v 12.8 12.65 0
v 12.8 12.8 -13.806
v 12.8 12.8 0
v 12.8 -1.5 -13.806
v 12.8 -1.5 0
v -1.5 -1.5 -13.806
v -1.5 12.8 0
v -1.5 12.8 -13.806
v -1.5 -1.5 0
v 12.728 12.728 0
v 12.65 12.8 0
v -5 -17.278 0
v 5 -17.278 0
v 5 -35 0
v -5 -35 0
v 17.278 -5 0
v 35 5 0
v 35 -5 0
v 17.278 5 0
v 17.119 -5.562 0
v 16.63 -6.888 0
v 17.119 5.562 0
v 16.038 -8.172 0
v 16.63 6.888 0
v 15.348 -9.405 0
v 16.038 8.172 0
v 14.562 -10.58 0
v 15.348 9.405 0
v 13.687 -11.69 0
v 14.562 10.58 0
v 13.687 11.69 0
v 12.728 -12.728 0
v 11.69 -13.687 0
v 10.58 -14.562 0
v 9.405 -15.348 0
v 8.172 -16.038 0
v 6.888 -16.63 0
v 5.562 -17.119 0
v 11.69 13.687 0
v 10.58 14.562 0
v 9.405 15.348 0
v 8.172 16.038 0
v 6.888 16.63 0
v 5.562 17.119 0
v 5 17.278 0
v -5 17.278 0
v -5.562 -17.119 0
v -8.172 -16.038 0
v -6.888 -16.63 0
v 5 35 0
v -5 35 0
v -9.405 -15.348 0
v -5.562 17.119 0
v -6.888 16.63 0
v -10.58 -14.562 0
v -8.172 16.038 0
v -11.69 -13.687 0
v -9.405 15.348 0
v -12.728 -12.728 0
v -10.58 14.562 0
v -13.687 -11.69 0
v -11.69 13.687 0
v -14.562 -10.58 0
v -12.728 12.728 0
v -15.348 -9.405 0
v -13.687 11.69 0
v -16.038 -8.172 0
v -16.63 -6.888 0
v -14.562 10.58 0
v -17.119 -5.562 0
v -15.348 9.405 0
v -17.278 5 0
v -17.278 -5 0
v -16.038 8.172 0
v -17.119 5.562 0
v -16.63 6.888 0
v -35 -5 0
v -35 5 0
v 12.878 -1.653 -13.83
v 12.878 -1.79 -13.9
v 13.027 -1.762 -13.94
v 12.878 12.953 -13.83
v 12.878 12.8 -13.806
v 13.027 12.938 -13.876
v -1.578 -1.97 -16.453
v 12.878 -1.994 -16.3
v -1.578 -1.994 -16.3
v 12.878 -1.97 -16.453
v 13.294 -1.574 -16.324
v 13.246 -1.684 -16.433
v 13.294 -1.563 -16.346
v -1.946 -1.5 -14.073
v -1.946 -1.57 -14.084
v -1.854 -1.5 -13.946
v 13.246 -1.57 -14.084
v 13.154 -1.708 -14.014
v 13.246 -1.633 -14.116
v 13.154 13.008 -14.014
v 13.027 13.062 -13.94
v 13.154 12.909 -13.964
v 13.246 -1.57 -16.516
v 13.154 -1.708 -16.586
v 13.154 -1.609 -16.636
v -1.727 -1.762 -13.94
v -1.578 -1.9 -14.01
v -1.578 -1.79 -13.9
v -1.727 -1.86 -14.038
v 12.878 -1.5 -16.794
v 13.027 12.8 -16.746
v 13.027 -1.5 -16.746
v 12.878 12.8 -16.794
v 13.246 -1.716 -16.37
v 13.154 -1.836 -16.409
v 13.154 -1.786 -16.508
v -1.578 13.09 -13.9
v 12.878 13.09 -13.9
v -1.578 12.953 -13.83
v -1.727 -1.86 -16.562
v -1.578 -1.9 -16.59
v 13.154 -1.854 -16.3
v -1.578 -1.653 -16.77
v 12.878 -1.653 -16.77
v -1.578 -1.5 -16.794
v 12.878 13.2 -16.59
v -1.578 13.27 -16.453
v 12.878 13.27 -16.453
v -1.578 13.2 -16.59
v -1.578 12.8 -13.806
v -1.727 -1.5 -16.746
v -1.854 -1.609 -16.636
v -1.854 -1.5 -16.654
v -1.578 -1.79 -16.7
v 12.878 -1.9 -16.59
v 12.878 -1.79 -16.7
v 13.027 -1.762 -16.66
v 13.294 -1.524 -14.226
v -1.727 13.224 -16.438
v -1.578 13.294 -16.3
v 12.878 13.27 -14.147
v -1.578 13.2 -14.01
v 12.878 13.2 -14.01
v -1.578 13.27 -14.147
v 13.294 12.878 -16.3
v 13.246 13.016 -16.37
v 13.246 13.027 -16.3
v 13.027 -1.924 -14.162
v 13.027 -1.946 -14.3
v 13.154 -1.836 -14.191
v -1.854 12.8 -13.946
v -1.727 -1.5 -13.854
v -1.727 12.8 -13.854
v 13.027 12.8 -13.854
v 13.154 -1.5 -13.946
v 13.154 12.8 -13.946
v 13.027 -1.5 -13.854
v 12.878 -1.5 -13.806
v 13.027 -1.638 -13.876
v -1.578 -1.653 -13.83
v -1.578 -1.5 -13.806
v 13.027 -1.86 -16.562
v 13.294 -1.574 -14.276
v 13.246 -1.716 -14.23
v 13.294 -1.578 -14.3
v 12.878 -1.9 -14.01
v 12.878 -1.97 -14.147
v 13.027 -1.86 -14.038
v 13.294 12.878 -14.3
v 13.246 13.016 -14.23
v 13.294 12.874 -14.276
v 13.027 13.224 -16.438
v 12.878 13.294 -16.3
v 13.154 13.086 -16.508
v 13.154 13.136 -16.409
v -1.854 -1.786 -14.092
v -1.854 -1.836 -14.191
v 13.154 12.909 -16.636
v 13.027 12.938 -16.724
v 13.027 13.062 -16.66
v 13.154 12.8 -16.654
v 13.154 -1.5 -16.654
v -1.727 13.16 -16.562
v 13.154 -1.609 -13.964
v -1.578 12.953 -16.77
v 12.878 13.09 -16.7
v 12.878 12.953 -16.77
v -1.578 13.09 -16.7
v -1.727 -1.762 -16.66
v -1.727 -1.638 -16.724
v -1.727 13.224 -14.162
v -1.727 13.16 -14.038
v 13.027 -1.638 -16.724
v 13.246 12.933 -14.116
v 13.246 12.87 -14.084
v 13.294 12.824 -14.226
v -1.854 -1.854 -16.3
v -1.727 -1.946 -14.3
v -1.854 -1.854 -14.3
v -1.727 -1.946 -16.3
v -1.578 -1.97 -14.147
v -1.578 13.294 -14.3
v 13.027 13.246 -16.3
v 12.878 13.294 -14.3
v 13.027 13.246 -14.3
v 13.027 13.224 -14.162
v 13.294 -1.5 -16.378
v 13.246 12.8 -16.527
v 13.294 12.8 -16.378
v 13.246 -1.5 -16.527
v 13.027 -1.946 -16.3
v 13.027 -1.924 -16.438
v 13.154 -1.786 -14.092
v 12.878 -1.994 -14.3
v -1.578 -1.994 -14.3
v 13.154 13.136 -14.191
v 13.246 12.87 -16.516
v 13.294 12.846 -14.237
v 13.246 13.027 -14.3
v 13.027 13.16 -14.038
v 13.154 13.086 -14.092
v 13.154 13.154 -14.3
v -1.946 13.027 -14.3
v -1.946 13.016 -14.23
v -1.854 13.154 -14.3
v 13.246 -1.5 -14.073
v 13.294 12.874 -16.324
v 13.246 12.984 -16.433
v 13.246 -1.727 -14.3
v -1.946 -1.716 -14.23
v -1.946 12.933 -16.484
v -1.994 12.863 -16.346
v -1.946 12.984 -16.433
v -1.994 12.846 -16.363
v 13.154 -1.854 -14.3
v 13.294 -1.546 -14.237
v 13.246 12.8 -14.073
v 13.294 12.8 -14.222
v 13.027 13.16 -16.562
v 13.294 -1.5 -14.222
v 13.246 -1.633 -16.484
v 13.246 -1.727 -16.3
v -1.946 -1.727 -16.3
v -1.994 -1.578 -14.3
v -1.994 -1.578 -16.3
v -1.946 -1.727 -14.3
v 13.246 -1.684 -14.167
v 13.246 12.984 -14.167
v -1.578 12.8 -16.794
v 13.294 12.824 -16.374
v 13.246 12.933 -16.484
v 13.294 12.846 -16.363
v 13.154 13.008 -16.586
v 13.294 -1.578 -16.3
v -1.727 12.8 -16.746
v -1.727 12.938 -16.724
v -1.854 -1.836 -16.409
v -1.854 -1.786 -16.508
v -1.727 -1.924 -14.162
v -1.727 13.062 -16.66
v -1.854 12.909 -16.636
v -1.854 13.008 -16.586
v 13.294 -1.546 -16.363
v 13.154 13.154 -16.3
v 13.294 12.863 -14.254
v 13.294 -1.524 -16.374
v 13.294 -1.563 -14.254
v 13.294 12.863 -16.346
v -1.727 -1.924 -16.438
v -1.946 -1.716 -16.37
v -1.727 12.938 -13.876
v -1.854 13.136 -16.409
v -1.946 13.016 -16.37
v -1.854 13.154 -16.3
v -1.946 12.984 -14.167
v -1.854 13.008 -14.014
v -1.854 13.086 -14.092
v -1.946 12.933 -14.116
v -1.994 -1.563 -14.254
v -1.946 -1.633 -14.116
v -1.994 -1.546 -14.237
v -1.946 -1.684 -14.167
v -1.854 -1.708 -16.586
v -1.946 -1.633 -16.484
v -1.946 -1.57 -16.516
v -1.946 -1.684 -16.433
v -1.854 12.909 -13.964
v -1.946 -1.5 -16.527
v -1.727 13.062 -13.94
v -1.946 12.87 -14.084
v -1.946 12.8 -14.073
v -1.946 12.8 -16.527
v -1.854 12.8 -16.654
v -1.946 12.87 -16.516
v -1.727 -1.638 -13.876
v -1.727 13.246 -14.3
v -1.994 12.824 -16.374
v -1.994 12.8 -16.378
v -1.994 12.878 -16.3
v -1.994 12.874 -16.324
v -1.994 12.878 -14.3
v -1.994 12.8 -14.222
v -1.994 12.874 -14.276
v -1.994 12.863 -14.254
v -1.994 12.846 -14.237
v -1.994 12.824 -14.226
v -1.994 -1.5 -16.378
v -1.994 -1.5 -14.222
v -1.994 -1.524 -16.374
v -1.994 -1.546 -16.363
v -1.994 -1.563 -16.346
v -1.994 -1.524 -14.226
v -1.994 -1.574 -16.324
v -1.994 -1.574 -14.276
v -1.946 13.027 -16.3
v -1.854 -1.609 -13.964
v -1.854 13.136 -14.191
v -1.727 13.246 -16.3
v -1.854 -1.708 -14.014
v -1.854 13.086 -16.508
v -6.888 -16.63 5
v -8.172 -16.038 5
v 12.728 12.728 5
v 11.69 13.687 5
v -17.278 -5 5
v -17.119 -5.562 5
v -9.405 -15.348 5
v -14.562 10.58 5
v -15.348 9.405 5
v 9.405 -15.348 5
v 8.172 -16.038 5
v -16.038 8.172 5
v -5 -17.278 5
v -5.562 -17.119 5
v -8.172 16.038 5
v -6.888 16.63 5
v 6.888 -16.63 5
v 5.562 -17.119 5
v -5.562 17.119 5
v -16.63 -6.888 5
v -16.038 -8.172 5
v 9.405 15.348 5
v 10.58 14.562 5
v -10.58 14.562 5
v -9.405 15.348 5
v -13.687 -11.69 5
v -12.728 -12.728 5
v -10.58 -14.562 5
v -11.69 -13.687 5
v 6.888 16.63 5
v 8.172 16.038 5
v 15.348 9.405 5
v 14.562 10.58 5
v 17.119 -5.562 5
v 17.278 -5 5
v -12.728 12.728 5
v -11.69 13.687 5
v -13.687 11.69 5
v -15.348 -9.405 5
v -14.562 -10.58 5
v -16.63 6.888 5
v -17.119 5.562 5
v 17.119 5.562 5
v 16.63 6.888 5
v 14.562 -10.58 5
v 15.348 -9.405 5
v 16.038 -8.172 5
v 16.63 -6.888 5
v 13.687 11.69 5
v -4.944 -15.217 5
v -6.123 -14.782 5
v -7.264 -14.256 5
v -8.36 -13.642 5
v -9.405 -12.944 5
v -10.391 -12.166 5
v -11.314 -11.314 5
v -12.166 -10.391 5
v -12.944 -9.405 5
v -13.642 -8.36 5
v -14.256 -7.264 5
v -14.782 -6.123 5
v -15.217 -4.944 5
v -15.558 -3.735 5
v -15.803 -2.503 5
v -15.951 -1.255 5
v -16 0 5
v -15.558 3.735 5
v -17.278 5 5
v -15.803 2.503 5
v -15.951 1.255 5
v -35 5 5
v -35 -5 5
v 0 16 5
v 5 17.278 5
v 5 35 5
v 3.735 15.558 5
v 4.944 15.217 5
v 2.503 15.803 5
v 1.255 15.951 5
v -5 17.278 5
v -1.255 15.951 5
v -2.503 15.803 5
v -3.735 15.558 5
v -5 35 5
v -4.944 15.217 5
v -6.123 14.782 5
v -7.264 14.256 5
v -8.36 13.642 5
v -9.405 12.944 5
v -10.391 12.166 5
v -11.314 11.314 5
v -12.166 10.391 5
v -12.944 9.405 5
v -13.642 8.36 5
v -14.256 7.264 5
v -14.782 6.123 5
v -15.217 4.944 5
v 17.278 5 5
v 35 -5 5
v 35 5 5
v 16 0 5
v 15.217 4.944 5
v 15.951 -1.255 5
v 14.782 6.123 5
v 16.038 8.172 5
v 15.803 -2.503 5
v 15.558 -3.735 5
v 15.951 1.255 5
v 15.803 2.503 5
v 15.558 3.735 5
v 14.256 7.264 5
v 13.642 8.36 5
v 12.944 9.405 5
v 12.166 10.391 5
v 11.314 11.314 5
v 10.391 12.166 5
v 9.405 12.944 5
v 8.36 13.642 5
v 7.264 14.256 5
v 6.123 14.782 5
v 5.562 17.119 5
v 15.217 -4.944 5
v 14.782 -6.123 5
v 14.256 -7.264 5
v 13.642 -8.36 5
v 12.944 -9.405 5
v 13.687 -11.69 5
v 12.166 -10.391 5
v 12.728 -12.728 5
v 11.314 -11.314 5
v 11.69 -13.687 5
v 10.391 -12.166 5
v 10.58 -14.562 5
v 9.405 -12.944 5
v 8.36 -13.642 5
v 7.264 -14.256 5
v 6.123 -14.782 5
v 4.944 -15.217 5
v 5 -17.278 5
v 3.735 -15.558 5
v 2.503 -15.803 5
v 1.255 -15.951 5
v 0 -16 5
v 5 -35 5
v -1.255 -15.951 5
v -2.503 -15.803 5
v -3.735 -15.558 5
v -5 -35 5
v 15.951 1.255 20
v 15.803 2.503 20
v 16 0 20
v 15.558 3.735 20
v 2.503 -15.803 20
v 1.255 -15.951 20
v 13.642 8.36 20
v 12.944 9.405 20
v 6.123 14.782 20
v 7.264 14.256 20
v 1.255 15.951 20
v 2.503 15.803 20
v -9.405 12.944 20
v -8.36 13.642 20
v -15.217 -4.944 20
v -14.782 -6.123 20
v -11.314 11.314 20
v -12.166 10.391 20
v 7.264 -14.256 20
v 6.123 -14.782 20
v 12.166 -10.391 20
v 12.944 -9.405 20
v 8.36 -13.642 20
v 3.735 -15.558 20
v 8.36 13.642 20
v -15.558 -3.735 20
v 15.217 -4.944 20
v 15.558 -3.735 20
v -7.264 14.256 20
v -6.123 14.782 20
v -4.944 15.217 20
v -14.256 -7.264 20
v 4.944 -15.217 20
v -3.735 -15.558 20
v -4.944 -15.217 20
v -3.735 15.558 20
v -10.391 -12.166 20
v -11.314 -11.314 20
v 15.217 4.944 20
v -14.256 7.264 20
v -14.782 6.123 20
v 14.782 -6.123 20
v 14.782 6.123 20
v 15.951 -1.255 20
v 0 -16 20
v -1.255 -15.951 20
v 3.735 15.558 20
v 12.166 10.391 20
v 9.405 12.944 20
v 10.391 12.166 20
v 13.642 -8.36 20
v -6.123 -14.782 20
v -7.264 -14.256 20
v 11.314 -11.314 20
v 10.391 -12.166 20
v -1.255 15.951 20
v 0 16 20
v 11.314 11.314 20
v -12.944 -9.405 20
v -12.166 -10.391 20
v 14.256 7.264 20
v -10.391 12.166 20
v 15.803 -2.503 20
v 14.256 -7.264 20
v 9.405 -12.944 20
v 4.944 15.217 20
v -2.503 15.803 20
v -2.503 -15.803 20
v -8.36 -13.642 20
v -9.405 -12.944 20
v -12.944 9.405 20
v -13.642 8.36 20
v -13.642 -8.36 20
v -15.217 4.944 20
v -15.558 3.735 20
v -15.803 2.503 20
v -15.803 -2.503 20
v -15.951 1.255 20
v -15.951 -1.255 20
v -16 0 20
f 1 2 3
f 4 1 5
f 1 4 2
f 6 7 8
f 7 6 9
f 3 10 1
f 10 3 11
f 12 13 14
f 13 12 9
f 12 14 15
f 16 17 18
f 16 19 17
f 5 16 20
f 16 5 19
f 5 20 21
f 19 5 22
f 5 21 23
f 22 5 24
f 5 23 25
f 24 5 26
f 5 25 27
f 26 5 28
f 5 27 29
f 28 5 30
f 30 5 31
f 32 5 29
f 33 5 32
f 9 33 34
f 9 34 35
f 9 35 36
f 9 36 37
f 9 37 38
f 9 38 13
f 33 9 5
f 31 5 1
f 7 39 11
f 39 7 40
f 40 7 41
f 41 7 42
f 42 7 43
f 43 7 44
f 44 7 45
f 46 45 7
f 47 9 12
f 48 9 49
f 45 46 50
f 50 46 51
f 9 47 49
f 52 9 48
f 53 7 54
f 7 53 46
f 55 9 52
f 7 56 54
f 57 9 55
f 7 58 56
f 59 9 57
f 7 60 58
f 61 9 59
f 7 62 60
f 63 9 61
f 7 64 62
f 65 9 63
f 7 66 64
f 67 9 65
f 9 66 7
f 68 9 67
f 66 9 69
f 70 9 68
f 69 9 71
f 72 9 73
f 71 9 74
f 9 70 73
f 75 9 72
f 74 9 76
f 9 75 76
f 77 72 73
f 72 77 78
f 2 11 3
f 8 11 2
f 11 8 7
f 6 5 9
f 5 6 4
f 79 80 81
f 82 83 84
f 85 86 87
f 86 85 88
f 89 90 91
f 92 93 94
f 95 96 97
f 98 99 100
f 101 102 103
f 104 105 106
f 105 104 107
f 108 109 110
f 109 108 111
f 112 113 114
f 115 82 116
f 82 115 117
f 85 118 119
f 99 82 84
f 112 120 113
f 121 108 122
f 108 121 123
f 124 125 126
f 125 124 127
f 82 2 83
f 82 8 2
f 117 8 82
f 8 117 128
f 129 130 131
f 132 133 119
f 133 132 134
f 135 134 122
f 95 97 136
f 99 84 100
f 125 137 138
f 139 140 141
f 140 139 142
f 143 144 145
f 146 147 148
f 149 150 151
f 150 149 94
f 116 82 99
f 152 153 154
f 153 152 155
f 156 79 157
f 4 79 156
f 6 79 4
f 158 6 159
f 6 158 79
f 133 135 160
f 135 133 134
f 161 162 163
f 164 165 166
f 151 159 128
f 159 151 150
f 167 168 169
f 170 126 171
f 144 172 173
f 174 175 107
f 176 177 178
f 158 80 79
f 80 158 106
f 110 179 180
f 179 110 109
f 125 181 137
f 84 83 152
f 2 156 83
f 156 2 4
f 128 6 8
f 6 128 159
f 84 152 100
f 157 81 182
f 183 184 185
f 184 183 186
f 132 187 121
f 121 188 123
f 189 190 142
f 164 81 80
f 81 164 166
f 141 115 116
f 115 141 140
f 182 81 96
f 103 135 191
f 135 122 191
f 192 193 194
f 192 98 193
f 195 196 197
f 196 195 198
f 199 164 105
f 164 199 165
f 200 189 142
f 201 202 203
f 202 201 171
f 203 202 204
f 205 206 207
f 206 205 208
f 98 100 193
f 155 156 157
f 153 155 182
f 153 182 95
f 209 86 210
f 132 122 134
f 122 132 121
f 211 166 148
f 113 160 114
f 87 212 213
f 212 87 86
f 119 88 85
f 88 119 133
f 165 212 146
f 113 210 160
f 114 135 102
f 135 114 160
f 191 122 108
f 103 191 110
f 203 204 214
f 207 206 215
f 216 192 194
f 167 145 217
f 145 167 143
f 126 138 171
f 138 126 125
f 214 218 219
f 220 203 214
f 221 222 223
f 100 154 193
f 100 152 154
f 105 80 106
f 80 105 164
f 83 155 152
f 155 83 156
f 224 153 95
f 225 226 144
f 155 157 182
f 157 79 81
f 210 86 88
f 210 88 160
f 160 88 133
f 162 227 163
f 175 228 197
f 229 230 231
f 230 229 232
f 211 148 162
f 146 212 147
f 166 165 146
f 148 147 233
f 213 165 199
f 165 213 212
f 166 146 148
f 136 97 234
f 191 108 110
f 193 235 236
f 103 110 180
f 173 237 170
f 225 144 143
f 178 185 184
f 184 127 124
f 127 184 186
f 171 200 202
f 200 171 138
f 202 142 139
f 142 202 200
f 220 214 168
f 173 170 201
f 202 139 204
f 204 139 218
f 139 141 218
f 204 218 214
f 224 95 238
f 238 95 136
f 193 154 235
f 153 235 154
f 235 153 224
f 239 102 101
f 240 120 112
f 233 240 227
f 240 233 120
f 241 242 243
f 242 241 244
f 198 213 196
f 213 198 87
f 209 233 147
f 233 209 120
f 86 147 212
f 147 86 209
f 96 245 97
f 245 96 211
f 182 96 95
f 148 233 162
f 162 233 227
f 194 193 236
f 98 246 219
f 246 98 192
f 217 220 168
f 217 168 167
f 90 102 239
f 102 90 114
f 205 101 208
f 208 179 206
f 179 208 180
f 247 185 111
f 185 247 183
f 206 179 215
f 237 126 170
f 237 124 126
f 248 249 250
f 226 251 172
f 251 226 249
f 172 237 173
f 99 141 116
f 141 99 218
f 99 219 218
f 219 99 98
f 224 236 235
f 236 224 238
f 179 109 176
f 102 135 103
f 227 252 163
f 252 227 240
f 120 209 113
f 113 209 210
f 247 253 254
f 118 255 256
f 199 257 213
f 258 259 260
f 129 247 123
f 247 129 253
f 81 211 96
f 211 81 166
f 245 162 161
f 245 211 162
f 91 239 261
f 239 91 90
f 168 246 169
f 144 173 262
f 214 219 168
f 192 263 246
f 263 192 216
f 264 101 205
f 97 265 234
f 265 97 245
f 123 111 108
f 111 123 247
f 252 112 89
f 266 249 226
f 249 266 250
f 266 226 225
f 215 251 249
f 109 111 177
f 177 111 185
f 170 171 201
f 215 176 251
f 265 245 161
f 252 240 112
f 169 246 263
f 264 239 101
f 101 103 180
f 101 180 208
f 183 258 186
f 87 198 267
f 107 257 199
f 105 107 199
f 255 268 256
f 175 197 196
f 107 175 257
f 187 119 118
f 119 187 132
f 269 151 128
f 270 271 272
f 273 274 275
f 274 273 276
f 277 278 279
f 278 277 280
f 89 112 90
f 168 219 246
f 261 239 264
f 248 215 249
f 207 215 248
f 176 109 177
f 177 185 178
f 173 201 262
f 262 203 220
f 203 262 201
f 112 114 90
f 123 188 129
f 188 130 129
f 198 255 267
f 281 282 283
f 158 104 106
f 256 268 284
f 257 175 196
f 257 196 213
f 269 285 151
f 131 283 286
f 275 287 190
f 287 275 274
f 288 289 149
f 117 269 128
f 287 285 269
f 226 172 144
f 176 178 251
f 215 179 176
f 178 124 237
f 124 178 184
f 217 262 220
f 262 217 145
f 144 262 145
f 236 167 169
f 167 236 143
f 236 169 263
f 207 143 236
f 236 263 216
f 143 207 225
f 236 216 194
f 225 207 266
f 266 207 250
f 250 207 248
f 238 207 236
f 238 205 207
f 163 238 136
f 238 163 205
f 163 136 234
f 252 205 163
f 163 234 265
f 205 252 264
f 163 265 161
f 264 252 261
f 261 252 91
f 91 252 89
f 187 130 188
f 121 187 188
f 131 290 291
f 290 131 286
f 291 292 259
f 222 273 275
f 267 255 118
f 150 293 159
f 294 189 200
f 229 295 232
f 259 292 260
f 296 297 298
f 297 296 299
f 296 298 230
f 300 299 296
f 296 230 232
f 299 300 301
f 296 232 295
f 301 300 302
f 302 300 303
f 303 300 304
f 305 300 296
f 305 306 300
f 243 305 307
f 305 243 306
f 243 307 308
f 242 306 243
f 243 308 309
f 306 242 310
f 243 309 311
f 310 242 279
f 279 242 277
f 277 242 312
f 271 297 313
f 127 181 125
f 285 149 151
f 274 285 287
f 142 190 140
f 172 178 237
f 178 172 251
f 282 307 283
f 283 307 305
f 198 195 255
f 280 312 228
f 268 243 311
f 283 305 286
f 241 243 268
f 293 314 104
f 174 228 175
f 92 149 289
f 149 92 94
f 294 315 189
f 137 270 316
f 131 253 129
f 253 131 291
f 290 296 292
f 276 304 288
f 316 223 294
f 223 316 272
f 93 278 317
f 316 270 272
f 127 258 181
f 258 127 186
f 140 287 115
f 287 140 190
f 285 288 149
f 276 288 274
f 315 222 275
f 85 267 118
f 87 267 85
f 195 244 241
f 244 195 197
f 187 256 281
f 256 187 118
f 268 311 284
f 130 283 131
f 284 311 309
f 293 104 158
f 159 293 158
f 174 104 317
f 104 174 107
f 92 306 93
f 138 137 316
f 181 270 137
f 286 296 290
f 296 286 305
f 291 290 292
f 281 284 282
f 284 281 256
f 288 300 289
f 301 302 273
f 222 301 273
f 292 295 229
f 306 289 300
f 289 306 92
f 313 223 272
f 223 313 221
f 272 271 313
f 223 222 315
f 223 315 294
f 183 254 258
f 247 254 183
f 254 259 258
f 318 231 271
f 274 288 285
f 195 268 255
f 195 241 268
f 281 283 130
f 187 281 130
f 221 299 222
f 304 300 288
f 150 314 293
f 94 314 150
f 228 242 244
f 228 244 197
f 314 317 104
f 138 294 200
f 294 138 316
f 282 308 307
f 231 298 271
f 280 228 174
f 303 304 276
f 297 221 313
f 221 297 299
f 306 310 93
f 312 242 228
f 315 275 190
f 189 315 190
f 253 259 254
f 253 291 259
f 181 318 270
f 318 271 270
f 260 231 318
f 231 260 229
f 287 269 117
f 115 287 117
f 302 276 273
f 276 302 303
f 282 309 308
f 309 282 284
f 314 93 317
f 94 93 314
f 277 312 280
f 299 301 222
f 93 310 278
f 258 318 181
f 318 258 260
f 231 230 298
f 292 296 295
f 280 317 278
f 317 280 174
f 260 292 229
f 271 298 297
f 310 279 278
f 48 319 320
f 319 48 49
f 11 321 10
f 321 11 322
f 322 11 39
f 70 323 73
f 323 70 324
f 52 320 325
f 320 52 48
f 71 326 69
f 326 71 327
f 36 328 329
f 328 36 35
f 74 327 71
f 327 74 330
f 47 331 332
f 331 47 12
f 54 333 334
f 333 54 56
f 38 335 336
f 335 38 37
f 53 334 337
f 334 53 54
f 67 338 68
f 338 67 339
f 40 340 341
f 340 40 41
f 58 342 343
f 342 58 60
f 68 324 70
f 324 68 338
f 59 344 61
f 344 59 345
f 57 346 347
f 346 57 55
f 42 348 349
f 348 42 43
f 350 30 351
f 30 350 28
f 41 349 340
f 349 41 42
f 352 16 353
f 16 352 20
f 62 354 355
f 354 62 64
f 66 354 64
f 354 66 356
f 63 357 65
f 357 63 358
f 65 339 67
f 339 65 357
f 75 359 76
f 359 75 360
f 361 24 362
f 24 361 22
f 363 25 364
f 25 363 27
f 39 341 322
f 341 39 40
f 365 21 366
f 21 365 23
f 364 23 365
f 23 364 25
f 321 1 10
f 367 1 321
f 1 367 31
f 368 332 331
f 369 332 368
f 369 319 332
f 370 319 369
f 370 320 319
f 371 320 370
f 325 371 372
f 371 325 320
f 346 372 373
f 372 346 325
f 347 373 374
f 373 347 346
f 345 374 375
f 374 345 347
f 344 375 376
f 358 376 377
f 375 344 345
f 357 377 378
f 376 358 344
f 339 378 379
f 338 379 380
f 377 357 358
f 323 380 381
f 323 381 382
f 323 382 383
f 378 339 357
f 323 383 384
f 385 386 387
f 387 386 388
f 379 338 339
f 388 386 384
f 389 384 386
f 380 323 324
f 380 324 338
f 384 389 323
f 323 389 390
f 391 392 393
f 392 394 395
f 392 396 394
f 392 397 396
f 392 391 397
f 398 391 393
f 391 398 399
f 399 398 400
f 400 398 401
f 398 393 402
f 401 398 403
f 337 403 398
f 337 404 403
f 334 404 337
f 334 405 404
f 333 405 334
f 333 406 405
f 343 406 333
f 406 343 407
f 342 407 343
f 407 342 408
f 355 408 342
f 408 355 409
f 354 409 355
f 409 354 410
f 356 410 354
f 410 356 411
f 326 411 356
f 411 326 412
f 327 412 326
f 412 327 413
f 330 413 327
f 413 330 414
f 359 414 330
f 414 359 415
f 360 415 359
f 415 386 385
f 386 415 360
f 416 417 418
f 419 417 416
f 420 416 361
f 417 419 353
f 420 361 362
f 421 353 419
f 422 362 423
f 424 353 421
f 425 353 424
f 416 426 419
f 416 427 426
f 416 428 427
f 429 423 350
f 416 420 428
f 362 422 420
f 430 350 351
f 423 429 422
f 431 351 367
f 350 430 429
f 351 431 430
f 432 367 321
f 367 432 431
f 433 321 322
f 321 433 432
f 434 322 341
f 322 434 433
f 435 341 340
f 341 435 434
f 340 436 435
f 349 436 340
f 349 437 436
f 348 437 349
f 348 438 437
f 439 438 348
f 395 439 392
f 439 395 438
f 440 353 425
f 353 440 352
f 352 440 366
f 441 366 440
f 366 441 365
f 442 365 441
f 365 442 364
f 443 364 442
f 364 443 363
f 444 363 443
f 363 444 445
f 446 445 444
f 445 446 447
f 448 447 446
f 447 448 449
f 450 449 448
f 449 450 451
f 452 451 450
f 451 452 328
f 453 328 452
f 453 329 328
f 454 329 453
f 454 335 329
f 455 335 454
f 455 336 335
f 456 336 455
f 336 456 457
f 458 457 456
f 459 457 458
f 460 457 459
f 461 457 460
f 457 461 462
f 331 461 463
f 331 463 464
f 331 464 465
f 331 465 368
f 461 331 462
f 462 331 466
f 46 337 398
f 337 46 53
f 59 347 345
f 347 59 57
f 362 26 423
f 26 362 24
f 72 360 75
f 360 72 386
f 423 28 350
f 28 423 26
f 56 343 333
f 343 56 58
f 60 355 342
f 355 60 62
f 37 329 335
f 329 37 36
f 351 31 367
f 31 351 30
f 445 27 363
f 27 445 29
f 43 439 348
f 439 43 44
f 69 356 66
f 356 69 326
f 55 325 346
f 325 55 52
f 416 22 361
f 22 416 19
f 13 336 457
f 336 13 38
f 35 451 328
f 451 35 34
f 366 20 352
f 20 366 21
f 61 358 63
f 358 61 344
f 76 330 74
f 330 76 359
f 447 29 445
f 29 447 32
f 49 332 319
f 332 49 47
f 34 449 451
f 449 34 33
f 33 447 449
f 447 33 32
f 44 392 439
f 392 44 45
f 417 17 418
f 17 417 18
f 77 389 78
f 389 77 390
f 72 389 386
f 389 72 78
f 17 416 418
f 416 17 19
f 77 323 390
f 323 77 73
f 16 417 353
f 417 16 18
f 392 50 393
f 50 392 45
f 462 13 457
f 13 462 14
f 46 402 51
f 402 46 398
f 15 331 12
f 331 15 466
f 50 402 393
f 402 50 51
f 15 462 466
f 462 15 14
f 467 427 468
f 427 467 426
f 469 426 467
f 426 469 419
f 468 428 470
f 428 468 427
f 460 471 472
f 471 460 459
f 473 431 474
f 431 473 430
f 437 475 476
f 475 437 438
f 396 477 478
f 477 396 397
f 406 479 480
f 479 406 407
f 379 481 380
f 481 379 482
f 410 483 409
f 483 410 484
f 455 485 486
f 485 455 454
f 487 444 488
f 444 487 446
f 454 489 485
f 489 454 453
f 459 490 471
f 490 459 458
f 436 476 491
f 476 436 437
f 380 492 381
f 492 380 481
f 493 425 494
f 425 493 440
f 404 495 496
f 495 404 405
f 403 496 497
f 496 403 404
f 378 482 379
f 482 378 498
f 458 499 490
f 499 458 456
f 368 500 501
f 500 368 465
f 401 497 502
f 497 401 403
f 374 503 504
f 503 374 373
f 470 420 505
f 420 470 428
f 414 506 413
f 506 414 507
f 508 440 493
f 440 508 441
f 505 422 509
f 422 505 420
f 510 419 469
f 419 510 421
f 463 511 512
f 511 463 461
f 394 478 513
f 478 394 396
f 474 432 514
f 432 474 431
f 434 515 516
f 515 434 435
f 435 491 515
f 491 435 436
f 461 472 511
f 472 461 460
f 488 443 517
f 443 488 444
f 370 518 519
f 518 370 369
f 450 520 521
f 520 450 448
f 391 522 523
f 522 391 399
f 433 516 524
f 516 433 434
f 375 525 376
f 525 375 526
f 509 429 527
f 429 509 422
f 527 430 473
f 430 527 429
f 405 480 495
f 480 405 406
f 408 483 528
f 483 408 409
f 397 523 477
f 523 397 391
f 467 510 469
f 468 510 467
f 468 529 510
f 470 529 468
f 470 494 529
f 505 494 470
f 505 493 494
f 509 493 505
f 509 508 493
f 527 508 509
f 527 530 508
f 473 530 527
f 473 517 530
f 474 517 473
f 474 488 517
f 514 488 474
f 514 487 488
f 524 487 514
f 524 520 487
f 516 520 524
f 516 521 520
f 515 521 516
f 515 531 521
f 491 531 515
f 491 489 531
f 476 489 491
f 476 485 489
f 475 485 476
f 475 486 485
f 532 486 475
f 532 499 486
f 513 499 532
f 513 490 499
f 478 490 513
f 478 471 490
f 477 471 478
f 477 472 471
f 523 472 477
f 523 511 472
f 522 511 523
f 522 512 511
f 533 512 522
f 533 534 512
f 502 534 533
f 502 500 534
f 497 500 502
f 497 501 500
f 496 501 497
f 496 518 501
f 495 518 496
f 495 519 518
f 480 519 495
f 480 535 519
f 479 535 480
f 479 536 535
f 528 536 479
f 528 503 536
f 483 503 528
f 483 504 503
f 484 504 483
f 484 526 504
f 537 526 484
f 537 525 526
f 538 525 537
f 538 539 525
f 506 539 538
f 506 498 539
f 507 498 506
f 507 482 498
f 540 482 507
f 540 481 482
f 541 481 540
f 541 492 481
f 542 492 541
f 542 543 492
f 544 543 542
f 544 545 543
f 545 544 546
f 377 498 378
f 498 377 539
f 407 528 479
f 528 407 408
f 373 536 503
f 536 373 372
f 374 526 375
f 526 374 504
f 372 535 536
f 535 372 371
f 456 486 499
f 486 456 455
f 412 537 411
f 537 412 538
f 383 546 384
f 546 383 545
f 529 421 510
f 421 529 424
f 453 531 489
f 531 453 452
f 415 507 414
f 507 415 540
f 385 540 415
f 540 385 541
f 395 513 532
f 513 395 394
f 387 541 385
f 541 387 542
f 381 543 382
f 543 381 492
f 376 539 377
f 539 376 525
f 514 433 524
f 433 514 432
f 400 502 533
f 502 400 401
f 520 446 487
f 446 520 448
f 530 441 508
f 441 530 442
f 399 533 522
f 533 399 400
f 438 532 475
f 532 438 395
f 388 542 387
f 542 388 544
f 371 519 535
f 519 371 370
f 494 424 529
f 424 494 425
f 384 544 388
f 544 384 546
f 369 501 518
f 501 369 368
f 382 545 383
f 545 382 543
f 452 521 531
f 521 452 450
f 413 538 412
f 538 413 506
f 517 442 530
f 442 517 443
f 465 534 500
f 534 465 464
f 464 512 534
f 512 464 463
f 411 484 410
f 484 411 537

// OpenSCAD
$fn = 80;
s = 14.3;

/*
cylinder(d = 60,h = 3);
difference() {
    cylinder(d = 32, h = 30);
}
*/

translate([7, 7, -10]) cylinder(d = 11, h = 10);
translate([7, 7, -12]) cylinder(d1 = 10, d2= 11, h = 2);

cylinder(d = 36, h = 5);
translate([0, 0, 2.5]) cube([70, 10, 5], true);
translate([0, 0, 2.5]) cube([10, 70, 5], true);

difference() {
    cylinder(d = 32, h = 20);
}

translate([-1.5, -1.5, 0]) rotate([0, 90, 0]) mount();


module mount() {
    cube(s);
    translate([s, 0, 0]) minkowski() {
        cube([2, s, s]);
        sphere(d = 1, $fn =20);
    }
}
